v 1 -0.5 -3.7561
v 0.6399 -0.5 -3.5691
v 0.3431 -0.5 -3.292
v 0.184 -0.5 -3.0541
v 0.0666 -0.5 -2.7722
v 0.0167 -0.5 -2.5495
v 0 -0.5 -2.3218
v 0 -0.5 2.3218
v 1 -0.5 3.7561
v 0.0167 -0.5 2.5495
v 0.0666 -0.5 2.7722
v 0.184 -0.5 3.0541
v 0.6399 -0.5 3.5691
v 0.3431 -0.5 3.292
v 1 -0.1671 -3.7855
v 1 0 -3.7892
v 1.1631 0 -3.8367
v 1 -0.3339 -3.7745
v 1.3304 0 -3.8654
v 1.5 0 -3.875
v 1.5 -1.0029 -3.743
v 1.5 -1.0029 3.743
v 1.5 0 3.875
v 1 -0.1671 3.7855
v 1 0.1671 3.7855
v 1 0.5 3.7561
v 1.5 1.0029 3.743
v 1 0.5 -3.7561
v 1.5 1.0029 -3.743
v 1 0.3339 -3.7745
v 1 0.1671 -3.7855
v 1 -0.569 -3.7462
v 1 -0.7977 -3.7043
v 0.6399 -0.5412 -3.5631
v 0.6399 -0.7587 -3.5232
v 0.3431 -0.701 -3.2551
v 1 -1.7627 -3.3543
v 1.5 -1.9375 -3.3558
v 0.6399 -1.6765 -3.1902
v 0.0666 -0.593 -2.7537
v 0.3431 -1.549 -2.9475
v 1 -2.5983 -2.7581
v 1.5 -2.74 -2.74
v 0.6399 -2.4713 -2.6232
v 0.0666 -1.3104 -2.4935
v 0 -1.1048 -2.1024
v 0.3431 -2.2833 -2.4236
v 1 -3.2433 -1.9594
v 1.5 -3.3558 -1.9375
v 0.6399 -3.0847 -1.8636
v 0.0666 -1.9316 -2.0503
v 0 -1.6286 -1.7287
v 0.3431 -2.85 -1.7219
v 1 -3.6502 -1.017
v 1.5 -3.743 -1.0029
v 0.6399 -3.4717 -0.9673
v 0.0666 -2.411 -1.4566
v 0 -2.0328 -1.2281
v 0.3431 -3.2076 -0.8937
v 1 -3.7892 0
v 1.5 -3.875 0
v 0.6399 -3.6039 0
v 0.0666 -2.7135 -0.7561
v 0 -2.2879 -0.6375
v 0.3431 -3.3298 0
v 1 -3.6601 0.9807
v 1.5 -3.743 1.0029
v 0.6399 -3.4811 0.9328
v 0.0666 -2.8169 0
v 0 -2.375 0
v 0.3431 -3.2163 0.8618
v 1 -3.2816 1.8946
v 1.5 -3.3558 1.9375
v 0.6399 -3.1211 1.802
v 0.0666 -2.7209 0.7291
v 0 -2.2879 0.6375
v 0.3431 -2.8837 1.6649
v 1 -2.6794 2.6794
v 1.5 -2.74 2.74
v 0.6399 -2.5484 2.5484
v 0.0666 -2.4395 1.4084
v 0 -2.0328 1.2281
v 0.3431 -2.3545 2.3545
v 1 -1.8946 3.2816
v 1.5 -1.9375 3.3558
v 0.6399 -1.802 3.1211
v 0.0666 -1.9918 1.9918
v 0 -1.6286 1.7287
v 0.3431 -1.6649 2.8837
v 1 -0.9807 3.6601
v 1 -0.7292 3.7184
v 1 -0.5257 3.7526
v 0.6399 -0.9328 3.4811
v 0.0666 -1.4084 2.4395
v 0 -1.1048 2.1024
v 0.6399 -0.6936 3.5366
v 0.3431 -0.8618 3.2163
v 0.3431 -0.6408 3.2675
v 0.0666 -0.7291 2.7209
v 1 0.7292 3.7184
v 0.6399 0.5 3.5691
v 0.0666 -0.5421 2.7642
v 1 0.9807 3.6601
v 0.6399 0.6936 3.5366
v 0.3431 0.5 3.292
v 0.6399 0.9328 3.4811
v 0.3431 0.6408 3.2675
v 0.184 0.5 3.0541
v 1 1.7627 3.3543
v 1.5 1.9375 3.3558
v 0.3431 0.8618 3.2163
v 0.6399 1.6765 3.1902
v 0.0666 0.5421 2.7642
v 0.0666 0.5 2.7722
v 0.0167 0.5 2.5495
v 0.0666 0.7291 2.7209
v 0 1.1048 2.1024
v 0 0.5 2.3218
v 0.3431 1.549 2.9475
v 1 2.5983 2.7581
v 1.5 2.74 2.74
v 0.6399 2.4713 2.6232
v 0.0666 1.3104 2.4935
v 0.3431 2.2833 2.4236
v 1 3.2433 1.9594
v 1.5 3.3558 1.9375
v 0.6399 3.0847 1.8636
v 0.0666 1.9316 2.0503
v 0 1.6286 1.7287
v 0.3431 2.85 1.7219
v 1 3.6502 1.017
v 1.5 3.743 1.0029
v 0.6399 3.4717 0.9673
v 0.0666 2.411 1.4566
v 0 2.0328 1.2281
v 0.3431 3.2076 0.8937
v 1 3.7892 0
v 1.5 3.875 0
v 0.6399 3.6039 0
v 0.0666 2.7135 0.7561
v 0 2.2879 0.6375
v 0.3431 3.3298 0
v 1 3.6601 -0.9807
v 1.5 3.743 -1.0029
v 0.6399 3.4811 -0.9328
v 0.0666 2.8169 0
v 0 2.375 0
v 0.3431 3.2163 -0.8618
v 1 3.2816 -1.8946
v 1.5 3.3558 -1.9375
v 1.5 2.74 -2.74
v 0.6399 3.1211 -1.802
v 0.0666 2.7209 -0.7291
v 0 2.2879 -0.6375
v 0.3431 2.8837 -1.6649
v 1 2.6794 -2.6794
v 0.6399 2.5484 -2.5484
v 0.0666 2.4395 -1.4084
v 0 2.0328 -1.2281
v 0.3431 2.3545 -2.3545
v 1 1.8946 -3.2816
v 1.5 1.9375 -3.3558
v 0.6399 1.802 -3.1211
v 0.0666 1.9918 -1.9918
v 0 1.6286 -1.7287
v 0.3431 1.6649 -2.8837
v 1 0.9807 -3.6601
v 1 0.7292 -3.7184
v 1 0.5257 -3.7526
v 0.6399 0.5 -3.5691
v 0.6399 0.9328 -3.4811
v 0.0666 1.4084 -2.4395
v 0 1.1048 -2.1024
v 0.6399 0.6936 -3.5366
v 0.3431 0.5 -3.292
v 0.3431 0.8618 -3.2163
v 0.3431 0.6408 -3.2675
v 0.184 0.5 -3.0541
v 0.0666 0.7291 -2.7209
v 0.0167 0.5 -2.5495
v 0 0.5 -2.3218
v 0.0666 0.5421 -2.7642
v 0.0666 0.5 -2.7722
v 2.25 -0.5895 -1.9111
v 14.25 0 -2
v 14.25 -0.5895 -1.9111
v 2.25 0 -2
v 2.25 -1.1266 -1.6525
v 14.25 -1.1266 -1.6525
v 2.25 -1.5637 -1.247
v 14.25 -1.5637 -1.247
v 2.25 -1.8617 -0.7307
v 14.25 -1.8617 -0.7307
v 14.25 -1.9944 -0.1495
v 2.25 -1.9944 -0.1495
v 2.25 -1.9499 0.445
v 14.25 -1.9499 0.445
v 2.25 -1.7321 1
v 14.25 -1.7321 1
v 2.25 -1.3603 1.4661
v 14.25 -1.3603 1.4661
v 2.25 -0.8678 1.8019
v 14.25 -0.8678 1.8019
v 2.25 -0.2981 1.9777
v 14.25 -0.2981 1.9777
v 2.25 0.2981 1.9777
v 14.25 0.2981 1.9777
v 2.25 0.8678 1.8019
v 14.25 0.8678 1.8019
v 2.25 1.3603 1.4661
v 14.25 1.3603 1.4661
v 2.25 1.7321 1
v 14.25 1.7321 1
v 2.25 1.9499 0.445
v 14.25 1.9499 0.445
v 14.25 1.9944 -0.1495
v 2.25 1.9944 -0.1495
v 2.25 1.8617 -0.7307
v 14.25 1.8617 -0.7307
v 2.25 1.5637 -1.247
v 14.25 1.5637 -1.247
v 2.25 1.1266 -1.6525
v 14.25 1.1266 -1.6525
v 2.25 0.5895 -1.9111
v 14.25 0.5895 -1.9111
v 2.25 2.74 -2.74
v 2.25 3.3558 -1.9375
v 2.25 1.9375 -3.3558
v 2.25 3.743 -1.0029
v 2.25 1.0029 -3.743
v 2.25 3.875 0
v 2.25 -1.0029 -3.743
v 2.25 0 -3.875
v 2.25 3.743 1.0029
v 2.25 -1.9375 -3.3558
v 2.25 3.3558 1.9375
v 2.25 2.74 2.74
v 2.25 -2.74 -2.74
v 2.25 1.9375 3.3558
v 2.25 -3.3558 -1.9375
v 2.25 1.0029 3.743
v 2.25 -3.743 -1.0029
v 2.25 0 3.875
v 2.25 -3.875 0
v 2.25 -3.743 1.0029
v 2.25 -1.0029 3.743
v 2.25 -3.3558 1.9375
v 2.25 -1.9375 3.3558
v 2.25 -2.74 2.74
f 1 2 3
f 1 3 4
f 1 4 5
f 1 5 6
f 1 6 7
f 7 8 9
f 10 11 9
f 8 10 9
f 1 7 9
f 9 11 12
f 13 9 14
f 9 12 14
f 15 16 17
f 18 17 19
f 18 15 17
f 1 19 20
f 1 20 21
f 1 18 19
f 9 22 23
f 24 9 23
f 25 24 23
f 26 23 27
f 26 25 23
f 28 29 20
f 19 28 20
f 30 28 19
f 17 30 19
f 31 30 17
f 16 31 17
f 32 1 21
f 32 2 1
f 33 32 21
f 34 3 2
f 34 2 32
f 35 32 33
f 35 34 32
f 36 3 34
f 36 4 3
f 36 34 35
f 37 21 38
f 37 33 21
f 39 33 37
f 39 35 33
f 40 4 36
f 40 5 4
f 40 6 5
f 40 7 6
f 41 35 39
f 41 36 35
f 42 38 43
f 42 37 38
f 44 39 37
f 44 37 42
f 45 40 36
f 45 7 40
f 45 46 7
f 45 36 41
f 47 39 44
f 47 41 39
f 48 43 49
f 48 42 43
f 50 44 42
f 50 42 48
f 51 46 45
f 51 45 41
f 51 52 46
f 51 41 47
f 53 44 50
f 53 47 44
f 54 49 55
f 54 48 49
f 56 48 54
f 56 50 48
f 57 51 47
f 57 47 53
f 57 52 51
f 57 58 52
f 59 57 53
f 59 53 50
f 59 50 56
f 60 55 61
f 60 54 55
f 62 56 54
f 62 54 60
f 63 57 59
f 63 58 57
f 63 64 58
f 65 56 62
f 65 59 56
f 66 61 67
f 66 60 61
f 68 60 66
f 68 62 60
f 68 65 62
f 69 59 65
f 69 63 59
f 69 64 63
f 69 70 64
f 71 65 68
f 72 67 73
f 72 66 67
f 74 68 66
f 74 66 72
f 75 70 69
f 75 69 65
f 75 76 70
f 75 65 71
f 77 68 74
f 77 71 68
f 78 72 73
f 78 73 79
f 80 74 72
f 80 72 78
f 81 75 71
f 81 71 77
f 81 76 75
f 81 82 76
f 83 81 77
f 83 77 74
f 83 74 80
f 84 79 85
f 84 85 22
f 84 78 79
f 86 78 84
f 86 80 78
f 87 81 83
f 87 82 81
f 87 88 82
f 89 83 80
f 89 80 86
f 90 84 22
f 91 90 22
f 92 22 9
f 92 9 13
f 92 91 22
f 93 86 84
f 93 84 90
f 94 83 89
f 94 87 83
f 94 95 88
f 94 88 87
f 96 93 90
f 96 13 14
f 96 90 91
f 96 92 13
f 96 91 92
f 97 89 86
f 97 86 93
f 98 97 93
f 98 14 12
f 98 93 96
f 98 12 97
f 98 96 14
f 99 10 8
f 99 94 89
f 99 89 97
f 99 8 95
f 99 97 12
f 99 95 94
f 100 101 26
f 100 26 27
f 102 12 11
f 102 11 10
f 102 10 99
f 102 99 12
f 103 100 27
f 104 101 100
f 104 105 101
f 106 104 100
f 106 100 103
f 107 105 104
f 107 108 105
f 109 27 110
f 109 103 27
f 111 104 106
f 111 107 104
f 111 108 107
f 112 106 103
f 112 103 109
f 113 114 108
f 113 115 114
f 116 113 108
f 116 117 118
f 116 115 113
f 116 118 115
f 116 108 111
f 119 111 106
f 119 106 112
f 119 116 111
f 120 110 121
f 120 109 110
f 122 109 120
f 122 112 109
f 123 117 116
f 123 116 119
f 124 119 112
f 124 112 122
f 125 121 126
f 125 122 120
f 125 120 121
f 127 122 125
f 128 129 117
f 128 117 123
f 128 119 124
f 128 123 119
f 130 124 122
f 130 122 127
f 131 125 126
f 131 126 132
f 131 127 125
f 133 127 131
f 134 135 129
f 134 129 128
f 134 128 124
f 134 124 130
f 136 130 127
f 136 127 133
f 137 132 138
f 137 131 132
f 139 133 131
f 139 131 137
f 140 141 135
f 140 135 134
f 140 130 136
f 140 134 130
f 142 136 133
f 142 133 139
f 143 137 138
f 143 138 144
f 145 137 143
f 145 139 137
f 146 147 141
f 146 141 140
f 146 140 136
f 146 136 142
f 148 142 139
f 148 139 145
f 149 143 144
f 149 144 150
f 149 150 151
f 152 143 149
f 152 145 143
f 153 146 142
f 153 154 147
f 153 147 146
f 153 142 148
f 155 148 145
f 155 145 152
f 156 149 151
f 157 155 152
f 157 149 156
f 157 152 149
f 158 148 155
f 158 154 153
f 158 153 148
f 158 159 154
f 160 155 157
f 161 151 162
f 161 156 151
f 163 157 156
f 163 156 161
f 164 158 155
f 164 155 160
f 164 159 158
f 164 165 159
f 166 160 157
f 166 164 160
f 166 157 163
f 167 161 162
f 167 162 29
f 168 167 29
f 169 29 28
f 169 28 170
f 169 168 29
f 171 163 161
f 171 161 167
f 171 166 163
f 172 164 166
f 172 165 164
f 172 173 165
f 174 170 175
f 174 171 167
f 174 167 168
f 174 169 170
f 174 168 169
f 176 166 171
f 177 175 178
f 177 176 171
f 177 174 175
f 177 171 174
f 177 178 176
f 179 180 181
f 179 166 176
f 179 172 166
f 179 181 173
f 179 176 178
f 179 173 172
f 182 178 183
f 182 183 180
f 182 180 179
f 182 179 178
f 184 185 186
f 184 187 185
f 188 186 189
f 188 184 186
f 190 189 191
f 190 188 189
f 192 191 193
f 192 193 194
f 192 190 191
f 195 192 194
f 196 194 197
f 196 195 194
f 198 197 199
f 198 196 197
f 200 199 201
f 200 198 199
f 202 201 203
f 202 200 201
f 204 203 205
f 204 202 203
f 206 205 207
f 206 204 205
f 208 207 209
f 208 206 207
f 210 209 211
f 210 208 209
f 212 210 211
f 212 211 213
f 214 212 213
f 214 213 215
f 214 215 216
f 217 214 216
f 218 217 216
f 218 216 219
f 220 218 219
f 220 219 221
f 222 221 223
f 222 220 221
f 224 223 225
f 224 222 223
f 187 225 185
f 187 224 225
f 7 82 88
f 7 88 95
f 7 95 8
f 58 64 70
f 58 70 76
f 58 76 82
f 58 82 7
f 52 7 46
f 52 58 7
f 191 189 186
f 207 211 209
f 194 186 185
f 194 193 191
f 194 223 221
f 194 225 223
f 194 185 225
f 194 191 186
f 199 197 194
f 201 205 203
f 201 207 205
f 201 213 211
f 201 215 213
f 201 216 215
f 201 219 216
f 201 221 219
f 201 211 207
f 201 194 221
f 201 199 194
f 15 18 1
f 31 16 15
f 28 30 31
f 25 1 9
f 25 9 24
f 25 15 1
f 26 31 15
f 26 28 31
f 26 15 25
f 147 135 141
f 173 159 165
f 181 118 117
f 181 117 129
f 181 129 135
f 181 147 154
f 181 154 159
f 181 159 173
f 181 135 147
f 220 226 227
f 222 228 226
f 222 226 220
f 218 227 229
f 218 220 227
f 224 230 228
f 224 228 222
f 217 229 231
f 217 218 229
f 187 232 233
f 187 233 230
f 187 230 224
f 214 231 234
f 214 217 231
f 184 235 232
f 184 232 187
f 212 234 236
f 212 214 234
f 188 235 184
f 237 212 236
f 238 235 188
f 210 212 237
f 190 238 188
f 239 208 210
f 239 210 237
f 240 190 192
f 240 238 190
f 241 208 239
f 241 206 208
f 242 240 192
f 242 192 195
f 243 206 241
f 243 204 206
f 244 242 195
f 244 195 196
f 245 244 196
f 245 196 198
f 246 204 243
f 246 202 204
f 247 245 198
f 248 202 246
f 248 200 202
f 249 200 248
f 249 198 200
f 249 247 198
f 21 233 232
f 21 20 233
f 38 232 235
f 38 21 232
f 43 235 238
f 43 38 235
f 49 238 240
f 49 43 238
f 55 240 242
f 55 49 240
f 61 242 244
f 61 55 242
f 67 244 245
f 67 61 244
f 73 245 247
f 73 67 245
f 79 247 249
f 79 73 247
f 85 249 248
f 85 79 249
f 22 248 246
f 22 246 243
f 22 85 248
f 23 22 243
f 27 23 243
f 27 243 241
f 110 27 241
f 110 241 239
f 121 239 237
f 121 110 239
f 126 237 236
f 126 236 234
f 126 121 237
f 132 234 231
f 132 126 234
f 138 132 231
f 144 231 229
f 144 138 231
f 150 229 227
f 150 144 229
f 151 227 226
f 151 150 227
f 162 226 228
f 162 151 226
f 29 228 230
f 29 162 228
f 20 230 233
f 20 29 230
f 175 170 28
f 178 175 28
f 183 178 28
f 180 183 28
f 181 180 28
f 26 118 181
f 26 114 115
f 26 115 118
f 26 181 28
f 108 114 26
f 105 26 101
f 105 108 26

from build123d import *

# Parameters (mm, degrees)
SKETCH2_W          = 12.190003068
SKETCH2_H          = 1
CUT_EXTRUDE1_DEPTH = 1


with BuildPart() as part:
    # Sketch1 → Revolve1 (revolve)
    with BuildSketch(Plane.XY, mode=Mode.PRIVATE) as revolve1_sk:
        with BuildLine():
            Line((0, 0), (14.25, 0))
            Line((14.25, 0), (14.25, 2))
            Line((14.25, 2), (2.25, 2))
            Line((2.25, 2), (2.25, 3.875))
            Line((2.25, 3.875), (1.5, 3.875))
            ThreePointArc((1.5, 3.875), (0.439339828, 3.435660172), (0, 2.375))
            Line((0, 2.375), (0, 0))
        make_face()
    revolve(revolve1_sk.sketch.rotate(Axis((0, 0, 0), (-1, 0, 0)), 90), axis=Axis((0, 0, 0), (-1, 0, 0)))

    # Sketch2 → Cut-Extrude1 (cut)
    with BuildSketch(Plane.ZY):
        Rectangle(SKETCH2_W, SKETCH2_H)
    extrude(amount=-CUT_EXTRUDE1_DEPTH, mode=Mode.SUBTRACT)


solid = part.part
